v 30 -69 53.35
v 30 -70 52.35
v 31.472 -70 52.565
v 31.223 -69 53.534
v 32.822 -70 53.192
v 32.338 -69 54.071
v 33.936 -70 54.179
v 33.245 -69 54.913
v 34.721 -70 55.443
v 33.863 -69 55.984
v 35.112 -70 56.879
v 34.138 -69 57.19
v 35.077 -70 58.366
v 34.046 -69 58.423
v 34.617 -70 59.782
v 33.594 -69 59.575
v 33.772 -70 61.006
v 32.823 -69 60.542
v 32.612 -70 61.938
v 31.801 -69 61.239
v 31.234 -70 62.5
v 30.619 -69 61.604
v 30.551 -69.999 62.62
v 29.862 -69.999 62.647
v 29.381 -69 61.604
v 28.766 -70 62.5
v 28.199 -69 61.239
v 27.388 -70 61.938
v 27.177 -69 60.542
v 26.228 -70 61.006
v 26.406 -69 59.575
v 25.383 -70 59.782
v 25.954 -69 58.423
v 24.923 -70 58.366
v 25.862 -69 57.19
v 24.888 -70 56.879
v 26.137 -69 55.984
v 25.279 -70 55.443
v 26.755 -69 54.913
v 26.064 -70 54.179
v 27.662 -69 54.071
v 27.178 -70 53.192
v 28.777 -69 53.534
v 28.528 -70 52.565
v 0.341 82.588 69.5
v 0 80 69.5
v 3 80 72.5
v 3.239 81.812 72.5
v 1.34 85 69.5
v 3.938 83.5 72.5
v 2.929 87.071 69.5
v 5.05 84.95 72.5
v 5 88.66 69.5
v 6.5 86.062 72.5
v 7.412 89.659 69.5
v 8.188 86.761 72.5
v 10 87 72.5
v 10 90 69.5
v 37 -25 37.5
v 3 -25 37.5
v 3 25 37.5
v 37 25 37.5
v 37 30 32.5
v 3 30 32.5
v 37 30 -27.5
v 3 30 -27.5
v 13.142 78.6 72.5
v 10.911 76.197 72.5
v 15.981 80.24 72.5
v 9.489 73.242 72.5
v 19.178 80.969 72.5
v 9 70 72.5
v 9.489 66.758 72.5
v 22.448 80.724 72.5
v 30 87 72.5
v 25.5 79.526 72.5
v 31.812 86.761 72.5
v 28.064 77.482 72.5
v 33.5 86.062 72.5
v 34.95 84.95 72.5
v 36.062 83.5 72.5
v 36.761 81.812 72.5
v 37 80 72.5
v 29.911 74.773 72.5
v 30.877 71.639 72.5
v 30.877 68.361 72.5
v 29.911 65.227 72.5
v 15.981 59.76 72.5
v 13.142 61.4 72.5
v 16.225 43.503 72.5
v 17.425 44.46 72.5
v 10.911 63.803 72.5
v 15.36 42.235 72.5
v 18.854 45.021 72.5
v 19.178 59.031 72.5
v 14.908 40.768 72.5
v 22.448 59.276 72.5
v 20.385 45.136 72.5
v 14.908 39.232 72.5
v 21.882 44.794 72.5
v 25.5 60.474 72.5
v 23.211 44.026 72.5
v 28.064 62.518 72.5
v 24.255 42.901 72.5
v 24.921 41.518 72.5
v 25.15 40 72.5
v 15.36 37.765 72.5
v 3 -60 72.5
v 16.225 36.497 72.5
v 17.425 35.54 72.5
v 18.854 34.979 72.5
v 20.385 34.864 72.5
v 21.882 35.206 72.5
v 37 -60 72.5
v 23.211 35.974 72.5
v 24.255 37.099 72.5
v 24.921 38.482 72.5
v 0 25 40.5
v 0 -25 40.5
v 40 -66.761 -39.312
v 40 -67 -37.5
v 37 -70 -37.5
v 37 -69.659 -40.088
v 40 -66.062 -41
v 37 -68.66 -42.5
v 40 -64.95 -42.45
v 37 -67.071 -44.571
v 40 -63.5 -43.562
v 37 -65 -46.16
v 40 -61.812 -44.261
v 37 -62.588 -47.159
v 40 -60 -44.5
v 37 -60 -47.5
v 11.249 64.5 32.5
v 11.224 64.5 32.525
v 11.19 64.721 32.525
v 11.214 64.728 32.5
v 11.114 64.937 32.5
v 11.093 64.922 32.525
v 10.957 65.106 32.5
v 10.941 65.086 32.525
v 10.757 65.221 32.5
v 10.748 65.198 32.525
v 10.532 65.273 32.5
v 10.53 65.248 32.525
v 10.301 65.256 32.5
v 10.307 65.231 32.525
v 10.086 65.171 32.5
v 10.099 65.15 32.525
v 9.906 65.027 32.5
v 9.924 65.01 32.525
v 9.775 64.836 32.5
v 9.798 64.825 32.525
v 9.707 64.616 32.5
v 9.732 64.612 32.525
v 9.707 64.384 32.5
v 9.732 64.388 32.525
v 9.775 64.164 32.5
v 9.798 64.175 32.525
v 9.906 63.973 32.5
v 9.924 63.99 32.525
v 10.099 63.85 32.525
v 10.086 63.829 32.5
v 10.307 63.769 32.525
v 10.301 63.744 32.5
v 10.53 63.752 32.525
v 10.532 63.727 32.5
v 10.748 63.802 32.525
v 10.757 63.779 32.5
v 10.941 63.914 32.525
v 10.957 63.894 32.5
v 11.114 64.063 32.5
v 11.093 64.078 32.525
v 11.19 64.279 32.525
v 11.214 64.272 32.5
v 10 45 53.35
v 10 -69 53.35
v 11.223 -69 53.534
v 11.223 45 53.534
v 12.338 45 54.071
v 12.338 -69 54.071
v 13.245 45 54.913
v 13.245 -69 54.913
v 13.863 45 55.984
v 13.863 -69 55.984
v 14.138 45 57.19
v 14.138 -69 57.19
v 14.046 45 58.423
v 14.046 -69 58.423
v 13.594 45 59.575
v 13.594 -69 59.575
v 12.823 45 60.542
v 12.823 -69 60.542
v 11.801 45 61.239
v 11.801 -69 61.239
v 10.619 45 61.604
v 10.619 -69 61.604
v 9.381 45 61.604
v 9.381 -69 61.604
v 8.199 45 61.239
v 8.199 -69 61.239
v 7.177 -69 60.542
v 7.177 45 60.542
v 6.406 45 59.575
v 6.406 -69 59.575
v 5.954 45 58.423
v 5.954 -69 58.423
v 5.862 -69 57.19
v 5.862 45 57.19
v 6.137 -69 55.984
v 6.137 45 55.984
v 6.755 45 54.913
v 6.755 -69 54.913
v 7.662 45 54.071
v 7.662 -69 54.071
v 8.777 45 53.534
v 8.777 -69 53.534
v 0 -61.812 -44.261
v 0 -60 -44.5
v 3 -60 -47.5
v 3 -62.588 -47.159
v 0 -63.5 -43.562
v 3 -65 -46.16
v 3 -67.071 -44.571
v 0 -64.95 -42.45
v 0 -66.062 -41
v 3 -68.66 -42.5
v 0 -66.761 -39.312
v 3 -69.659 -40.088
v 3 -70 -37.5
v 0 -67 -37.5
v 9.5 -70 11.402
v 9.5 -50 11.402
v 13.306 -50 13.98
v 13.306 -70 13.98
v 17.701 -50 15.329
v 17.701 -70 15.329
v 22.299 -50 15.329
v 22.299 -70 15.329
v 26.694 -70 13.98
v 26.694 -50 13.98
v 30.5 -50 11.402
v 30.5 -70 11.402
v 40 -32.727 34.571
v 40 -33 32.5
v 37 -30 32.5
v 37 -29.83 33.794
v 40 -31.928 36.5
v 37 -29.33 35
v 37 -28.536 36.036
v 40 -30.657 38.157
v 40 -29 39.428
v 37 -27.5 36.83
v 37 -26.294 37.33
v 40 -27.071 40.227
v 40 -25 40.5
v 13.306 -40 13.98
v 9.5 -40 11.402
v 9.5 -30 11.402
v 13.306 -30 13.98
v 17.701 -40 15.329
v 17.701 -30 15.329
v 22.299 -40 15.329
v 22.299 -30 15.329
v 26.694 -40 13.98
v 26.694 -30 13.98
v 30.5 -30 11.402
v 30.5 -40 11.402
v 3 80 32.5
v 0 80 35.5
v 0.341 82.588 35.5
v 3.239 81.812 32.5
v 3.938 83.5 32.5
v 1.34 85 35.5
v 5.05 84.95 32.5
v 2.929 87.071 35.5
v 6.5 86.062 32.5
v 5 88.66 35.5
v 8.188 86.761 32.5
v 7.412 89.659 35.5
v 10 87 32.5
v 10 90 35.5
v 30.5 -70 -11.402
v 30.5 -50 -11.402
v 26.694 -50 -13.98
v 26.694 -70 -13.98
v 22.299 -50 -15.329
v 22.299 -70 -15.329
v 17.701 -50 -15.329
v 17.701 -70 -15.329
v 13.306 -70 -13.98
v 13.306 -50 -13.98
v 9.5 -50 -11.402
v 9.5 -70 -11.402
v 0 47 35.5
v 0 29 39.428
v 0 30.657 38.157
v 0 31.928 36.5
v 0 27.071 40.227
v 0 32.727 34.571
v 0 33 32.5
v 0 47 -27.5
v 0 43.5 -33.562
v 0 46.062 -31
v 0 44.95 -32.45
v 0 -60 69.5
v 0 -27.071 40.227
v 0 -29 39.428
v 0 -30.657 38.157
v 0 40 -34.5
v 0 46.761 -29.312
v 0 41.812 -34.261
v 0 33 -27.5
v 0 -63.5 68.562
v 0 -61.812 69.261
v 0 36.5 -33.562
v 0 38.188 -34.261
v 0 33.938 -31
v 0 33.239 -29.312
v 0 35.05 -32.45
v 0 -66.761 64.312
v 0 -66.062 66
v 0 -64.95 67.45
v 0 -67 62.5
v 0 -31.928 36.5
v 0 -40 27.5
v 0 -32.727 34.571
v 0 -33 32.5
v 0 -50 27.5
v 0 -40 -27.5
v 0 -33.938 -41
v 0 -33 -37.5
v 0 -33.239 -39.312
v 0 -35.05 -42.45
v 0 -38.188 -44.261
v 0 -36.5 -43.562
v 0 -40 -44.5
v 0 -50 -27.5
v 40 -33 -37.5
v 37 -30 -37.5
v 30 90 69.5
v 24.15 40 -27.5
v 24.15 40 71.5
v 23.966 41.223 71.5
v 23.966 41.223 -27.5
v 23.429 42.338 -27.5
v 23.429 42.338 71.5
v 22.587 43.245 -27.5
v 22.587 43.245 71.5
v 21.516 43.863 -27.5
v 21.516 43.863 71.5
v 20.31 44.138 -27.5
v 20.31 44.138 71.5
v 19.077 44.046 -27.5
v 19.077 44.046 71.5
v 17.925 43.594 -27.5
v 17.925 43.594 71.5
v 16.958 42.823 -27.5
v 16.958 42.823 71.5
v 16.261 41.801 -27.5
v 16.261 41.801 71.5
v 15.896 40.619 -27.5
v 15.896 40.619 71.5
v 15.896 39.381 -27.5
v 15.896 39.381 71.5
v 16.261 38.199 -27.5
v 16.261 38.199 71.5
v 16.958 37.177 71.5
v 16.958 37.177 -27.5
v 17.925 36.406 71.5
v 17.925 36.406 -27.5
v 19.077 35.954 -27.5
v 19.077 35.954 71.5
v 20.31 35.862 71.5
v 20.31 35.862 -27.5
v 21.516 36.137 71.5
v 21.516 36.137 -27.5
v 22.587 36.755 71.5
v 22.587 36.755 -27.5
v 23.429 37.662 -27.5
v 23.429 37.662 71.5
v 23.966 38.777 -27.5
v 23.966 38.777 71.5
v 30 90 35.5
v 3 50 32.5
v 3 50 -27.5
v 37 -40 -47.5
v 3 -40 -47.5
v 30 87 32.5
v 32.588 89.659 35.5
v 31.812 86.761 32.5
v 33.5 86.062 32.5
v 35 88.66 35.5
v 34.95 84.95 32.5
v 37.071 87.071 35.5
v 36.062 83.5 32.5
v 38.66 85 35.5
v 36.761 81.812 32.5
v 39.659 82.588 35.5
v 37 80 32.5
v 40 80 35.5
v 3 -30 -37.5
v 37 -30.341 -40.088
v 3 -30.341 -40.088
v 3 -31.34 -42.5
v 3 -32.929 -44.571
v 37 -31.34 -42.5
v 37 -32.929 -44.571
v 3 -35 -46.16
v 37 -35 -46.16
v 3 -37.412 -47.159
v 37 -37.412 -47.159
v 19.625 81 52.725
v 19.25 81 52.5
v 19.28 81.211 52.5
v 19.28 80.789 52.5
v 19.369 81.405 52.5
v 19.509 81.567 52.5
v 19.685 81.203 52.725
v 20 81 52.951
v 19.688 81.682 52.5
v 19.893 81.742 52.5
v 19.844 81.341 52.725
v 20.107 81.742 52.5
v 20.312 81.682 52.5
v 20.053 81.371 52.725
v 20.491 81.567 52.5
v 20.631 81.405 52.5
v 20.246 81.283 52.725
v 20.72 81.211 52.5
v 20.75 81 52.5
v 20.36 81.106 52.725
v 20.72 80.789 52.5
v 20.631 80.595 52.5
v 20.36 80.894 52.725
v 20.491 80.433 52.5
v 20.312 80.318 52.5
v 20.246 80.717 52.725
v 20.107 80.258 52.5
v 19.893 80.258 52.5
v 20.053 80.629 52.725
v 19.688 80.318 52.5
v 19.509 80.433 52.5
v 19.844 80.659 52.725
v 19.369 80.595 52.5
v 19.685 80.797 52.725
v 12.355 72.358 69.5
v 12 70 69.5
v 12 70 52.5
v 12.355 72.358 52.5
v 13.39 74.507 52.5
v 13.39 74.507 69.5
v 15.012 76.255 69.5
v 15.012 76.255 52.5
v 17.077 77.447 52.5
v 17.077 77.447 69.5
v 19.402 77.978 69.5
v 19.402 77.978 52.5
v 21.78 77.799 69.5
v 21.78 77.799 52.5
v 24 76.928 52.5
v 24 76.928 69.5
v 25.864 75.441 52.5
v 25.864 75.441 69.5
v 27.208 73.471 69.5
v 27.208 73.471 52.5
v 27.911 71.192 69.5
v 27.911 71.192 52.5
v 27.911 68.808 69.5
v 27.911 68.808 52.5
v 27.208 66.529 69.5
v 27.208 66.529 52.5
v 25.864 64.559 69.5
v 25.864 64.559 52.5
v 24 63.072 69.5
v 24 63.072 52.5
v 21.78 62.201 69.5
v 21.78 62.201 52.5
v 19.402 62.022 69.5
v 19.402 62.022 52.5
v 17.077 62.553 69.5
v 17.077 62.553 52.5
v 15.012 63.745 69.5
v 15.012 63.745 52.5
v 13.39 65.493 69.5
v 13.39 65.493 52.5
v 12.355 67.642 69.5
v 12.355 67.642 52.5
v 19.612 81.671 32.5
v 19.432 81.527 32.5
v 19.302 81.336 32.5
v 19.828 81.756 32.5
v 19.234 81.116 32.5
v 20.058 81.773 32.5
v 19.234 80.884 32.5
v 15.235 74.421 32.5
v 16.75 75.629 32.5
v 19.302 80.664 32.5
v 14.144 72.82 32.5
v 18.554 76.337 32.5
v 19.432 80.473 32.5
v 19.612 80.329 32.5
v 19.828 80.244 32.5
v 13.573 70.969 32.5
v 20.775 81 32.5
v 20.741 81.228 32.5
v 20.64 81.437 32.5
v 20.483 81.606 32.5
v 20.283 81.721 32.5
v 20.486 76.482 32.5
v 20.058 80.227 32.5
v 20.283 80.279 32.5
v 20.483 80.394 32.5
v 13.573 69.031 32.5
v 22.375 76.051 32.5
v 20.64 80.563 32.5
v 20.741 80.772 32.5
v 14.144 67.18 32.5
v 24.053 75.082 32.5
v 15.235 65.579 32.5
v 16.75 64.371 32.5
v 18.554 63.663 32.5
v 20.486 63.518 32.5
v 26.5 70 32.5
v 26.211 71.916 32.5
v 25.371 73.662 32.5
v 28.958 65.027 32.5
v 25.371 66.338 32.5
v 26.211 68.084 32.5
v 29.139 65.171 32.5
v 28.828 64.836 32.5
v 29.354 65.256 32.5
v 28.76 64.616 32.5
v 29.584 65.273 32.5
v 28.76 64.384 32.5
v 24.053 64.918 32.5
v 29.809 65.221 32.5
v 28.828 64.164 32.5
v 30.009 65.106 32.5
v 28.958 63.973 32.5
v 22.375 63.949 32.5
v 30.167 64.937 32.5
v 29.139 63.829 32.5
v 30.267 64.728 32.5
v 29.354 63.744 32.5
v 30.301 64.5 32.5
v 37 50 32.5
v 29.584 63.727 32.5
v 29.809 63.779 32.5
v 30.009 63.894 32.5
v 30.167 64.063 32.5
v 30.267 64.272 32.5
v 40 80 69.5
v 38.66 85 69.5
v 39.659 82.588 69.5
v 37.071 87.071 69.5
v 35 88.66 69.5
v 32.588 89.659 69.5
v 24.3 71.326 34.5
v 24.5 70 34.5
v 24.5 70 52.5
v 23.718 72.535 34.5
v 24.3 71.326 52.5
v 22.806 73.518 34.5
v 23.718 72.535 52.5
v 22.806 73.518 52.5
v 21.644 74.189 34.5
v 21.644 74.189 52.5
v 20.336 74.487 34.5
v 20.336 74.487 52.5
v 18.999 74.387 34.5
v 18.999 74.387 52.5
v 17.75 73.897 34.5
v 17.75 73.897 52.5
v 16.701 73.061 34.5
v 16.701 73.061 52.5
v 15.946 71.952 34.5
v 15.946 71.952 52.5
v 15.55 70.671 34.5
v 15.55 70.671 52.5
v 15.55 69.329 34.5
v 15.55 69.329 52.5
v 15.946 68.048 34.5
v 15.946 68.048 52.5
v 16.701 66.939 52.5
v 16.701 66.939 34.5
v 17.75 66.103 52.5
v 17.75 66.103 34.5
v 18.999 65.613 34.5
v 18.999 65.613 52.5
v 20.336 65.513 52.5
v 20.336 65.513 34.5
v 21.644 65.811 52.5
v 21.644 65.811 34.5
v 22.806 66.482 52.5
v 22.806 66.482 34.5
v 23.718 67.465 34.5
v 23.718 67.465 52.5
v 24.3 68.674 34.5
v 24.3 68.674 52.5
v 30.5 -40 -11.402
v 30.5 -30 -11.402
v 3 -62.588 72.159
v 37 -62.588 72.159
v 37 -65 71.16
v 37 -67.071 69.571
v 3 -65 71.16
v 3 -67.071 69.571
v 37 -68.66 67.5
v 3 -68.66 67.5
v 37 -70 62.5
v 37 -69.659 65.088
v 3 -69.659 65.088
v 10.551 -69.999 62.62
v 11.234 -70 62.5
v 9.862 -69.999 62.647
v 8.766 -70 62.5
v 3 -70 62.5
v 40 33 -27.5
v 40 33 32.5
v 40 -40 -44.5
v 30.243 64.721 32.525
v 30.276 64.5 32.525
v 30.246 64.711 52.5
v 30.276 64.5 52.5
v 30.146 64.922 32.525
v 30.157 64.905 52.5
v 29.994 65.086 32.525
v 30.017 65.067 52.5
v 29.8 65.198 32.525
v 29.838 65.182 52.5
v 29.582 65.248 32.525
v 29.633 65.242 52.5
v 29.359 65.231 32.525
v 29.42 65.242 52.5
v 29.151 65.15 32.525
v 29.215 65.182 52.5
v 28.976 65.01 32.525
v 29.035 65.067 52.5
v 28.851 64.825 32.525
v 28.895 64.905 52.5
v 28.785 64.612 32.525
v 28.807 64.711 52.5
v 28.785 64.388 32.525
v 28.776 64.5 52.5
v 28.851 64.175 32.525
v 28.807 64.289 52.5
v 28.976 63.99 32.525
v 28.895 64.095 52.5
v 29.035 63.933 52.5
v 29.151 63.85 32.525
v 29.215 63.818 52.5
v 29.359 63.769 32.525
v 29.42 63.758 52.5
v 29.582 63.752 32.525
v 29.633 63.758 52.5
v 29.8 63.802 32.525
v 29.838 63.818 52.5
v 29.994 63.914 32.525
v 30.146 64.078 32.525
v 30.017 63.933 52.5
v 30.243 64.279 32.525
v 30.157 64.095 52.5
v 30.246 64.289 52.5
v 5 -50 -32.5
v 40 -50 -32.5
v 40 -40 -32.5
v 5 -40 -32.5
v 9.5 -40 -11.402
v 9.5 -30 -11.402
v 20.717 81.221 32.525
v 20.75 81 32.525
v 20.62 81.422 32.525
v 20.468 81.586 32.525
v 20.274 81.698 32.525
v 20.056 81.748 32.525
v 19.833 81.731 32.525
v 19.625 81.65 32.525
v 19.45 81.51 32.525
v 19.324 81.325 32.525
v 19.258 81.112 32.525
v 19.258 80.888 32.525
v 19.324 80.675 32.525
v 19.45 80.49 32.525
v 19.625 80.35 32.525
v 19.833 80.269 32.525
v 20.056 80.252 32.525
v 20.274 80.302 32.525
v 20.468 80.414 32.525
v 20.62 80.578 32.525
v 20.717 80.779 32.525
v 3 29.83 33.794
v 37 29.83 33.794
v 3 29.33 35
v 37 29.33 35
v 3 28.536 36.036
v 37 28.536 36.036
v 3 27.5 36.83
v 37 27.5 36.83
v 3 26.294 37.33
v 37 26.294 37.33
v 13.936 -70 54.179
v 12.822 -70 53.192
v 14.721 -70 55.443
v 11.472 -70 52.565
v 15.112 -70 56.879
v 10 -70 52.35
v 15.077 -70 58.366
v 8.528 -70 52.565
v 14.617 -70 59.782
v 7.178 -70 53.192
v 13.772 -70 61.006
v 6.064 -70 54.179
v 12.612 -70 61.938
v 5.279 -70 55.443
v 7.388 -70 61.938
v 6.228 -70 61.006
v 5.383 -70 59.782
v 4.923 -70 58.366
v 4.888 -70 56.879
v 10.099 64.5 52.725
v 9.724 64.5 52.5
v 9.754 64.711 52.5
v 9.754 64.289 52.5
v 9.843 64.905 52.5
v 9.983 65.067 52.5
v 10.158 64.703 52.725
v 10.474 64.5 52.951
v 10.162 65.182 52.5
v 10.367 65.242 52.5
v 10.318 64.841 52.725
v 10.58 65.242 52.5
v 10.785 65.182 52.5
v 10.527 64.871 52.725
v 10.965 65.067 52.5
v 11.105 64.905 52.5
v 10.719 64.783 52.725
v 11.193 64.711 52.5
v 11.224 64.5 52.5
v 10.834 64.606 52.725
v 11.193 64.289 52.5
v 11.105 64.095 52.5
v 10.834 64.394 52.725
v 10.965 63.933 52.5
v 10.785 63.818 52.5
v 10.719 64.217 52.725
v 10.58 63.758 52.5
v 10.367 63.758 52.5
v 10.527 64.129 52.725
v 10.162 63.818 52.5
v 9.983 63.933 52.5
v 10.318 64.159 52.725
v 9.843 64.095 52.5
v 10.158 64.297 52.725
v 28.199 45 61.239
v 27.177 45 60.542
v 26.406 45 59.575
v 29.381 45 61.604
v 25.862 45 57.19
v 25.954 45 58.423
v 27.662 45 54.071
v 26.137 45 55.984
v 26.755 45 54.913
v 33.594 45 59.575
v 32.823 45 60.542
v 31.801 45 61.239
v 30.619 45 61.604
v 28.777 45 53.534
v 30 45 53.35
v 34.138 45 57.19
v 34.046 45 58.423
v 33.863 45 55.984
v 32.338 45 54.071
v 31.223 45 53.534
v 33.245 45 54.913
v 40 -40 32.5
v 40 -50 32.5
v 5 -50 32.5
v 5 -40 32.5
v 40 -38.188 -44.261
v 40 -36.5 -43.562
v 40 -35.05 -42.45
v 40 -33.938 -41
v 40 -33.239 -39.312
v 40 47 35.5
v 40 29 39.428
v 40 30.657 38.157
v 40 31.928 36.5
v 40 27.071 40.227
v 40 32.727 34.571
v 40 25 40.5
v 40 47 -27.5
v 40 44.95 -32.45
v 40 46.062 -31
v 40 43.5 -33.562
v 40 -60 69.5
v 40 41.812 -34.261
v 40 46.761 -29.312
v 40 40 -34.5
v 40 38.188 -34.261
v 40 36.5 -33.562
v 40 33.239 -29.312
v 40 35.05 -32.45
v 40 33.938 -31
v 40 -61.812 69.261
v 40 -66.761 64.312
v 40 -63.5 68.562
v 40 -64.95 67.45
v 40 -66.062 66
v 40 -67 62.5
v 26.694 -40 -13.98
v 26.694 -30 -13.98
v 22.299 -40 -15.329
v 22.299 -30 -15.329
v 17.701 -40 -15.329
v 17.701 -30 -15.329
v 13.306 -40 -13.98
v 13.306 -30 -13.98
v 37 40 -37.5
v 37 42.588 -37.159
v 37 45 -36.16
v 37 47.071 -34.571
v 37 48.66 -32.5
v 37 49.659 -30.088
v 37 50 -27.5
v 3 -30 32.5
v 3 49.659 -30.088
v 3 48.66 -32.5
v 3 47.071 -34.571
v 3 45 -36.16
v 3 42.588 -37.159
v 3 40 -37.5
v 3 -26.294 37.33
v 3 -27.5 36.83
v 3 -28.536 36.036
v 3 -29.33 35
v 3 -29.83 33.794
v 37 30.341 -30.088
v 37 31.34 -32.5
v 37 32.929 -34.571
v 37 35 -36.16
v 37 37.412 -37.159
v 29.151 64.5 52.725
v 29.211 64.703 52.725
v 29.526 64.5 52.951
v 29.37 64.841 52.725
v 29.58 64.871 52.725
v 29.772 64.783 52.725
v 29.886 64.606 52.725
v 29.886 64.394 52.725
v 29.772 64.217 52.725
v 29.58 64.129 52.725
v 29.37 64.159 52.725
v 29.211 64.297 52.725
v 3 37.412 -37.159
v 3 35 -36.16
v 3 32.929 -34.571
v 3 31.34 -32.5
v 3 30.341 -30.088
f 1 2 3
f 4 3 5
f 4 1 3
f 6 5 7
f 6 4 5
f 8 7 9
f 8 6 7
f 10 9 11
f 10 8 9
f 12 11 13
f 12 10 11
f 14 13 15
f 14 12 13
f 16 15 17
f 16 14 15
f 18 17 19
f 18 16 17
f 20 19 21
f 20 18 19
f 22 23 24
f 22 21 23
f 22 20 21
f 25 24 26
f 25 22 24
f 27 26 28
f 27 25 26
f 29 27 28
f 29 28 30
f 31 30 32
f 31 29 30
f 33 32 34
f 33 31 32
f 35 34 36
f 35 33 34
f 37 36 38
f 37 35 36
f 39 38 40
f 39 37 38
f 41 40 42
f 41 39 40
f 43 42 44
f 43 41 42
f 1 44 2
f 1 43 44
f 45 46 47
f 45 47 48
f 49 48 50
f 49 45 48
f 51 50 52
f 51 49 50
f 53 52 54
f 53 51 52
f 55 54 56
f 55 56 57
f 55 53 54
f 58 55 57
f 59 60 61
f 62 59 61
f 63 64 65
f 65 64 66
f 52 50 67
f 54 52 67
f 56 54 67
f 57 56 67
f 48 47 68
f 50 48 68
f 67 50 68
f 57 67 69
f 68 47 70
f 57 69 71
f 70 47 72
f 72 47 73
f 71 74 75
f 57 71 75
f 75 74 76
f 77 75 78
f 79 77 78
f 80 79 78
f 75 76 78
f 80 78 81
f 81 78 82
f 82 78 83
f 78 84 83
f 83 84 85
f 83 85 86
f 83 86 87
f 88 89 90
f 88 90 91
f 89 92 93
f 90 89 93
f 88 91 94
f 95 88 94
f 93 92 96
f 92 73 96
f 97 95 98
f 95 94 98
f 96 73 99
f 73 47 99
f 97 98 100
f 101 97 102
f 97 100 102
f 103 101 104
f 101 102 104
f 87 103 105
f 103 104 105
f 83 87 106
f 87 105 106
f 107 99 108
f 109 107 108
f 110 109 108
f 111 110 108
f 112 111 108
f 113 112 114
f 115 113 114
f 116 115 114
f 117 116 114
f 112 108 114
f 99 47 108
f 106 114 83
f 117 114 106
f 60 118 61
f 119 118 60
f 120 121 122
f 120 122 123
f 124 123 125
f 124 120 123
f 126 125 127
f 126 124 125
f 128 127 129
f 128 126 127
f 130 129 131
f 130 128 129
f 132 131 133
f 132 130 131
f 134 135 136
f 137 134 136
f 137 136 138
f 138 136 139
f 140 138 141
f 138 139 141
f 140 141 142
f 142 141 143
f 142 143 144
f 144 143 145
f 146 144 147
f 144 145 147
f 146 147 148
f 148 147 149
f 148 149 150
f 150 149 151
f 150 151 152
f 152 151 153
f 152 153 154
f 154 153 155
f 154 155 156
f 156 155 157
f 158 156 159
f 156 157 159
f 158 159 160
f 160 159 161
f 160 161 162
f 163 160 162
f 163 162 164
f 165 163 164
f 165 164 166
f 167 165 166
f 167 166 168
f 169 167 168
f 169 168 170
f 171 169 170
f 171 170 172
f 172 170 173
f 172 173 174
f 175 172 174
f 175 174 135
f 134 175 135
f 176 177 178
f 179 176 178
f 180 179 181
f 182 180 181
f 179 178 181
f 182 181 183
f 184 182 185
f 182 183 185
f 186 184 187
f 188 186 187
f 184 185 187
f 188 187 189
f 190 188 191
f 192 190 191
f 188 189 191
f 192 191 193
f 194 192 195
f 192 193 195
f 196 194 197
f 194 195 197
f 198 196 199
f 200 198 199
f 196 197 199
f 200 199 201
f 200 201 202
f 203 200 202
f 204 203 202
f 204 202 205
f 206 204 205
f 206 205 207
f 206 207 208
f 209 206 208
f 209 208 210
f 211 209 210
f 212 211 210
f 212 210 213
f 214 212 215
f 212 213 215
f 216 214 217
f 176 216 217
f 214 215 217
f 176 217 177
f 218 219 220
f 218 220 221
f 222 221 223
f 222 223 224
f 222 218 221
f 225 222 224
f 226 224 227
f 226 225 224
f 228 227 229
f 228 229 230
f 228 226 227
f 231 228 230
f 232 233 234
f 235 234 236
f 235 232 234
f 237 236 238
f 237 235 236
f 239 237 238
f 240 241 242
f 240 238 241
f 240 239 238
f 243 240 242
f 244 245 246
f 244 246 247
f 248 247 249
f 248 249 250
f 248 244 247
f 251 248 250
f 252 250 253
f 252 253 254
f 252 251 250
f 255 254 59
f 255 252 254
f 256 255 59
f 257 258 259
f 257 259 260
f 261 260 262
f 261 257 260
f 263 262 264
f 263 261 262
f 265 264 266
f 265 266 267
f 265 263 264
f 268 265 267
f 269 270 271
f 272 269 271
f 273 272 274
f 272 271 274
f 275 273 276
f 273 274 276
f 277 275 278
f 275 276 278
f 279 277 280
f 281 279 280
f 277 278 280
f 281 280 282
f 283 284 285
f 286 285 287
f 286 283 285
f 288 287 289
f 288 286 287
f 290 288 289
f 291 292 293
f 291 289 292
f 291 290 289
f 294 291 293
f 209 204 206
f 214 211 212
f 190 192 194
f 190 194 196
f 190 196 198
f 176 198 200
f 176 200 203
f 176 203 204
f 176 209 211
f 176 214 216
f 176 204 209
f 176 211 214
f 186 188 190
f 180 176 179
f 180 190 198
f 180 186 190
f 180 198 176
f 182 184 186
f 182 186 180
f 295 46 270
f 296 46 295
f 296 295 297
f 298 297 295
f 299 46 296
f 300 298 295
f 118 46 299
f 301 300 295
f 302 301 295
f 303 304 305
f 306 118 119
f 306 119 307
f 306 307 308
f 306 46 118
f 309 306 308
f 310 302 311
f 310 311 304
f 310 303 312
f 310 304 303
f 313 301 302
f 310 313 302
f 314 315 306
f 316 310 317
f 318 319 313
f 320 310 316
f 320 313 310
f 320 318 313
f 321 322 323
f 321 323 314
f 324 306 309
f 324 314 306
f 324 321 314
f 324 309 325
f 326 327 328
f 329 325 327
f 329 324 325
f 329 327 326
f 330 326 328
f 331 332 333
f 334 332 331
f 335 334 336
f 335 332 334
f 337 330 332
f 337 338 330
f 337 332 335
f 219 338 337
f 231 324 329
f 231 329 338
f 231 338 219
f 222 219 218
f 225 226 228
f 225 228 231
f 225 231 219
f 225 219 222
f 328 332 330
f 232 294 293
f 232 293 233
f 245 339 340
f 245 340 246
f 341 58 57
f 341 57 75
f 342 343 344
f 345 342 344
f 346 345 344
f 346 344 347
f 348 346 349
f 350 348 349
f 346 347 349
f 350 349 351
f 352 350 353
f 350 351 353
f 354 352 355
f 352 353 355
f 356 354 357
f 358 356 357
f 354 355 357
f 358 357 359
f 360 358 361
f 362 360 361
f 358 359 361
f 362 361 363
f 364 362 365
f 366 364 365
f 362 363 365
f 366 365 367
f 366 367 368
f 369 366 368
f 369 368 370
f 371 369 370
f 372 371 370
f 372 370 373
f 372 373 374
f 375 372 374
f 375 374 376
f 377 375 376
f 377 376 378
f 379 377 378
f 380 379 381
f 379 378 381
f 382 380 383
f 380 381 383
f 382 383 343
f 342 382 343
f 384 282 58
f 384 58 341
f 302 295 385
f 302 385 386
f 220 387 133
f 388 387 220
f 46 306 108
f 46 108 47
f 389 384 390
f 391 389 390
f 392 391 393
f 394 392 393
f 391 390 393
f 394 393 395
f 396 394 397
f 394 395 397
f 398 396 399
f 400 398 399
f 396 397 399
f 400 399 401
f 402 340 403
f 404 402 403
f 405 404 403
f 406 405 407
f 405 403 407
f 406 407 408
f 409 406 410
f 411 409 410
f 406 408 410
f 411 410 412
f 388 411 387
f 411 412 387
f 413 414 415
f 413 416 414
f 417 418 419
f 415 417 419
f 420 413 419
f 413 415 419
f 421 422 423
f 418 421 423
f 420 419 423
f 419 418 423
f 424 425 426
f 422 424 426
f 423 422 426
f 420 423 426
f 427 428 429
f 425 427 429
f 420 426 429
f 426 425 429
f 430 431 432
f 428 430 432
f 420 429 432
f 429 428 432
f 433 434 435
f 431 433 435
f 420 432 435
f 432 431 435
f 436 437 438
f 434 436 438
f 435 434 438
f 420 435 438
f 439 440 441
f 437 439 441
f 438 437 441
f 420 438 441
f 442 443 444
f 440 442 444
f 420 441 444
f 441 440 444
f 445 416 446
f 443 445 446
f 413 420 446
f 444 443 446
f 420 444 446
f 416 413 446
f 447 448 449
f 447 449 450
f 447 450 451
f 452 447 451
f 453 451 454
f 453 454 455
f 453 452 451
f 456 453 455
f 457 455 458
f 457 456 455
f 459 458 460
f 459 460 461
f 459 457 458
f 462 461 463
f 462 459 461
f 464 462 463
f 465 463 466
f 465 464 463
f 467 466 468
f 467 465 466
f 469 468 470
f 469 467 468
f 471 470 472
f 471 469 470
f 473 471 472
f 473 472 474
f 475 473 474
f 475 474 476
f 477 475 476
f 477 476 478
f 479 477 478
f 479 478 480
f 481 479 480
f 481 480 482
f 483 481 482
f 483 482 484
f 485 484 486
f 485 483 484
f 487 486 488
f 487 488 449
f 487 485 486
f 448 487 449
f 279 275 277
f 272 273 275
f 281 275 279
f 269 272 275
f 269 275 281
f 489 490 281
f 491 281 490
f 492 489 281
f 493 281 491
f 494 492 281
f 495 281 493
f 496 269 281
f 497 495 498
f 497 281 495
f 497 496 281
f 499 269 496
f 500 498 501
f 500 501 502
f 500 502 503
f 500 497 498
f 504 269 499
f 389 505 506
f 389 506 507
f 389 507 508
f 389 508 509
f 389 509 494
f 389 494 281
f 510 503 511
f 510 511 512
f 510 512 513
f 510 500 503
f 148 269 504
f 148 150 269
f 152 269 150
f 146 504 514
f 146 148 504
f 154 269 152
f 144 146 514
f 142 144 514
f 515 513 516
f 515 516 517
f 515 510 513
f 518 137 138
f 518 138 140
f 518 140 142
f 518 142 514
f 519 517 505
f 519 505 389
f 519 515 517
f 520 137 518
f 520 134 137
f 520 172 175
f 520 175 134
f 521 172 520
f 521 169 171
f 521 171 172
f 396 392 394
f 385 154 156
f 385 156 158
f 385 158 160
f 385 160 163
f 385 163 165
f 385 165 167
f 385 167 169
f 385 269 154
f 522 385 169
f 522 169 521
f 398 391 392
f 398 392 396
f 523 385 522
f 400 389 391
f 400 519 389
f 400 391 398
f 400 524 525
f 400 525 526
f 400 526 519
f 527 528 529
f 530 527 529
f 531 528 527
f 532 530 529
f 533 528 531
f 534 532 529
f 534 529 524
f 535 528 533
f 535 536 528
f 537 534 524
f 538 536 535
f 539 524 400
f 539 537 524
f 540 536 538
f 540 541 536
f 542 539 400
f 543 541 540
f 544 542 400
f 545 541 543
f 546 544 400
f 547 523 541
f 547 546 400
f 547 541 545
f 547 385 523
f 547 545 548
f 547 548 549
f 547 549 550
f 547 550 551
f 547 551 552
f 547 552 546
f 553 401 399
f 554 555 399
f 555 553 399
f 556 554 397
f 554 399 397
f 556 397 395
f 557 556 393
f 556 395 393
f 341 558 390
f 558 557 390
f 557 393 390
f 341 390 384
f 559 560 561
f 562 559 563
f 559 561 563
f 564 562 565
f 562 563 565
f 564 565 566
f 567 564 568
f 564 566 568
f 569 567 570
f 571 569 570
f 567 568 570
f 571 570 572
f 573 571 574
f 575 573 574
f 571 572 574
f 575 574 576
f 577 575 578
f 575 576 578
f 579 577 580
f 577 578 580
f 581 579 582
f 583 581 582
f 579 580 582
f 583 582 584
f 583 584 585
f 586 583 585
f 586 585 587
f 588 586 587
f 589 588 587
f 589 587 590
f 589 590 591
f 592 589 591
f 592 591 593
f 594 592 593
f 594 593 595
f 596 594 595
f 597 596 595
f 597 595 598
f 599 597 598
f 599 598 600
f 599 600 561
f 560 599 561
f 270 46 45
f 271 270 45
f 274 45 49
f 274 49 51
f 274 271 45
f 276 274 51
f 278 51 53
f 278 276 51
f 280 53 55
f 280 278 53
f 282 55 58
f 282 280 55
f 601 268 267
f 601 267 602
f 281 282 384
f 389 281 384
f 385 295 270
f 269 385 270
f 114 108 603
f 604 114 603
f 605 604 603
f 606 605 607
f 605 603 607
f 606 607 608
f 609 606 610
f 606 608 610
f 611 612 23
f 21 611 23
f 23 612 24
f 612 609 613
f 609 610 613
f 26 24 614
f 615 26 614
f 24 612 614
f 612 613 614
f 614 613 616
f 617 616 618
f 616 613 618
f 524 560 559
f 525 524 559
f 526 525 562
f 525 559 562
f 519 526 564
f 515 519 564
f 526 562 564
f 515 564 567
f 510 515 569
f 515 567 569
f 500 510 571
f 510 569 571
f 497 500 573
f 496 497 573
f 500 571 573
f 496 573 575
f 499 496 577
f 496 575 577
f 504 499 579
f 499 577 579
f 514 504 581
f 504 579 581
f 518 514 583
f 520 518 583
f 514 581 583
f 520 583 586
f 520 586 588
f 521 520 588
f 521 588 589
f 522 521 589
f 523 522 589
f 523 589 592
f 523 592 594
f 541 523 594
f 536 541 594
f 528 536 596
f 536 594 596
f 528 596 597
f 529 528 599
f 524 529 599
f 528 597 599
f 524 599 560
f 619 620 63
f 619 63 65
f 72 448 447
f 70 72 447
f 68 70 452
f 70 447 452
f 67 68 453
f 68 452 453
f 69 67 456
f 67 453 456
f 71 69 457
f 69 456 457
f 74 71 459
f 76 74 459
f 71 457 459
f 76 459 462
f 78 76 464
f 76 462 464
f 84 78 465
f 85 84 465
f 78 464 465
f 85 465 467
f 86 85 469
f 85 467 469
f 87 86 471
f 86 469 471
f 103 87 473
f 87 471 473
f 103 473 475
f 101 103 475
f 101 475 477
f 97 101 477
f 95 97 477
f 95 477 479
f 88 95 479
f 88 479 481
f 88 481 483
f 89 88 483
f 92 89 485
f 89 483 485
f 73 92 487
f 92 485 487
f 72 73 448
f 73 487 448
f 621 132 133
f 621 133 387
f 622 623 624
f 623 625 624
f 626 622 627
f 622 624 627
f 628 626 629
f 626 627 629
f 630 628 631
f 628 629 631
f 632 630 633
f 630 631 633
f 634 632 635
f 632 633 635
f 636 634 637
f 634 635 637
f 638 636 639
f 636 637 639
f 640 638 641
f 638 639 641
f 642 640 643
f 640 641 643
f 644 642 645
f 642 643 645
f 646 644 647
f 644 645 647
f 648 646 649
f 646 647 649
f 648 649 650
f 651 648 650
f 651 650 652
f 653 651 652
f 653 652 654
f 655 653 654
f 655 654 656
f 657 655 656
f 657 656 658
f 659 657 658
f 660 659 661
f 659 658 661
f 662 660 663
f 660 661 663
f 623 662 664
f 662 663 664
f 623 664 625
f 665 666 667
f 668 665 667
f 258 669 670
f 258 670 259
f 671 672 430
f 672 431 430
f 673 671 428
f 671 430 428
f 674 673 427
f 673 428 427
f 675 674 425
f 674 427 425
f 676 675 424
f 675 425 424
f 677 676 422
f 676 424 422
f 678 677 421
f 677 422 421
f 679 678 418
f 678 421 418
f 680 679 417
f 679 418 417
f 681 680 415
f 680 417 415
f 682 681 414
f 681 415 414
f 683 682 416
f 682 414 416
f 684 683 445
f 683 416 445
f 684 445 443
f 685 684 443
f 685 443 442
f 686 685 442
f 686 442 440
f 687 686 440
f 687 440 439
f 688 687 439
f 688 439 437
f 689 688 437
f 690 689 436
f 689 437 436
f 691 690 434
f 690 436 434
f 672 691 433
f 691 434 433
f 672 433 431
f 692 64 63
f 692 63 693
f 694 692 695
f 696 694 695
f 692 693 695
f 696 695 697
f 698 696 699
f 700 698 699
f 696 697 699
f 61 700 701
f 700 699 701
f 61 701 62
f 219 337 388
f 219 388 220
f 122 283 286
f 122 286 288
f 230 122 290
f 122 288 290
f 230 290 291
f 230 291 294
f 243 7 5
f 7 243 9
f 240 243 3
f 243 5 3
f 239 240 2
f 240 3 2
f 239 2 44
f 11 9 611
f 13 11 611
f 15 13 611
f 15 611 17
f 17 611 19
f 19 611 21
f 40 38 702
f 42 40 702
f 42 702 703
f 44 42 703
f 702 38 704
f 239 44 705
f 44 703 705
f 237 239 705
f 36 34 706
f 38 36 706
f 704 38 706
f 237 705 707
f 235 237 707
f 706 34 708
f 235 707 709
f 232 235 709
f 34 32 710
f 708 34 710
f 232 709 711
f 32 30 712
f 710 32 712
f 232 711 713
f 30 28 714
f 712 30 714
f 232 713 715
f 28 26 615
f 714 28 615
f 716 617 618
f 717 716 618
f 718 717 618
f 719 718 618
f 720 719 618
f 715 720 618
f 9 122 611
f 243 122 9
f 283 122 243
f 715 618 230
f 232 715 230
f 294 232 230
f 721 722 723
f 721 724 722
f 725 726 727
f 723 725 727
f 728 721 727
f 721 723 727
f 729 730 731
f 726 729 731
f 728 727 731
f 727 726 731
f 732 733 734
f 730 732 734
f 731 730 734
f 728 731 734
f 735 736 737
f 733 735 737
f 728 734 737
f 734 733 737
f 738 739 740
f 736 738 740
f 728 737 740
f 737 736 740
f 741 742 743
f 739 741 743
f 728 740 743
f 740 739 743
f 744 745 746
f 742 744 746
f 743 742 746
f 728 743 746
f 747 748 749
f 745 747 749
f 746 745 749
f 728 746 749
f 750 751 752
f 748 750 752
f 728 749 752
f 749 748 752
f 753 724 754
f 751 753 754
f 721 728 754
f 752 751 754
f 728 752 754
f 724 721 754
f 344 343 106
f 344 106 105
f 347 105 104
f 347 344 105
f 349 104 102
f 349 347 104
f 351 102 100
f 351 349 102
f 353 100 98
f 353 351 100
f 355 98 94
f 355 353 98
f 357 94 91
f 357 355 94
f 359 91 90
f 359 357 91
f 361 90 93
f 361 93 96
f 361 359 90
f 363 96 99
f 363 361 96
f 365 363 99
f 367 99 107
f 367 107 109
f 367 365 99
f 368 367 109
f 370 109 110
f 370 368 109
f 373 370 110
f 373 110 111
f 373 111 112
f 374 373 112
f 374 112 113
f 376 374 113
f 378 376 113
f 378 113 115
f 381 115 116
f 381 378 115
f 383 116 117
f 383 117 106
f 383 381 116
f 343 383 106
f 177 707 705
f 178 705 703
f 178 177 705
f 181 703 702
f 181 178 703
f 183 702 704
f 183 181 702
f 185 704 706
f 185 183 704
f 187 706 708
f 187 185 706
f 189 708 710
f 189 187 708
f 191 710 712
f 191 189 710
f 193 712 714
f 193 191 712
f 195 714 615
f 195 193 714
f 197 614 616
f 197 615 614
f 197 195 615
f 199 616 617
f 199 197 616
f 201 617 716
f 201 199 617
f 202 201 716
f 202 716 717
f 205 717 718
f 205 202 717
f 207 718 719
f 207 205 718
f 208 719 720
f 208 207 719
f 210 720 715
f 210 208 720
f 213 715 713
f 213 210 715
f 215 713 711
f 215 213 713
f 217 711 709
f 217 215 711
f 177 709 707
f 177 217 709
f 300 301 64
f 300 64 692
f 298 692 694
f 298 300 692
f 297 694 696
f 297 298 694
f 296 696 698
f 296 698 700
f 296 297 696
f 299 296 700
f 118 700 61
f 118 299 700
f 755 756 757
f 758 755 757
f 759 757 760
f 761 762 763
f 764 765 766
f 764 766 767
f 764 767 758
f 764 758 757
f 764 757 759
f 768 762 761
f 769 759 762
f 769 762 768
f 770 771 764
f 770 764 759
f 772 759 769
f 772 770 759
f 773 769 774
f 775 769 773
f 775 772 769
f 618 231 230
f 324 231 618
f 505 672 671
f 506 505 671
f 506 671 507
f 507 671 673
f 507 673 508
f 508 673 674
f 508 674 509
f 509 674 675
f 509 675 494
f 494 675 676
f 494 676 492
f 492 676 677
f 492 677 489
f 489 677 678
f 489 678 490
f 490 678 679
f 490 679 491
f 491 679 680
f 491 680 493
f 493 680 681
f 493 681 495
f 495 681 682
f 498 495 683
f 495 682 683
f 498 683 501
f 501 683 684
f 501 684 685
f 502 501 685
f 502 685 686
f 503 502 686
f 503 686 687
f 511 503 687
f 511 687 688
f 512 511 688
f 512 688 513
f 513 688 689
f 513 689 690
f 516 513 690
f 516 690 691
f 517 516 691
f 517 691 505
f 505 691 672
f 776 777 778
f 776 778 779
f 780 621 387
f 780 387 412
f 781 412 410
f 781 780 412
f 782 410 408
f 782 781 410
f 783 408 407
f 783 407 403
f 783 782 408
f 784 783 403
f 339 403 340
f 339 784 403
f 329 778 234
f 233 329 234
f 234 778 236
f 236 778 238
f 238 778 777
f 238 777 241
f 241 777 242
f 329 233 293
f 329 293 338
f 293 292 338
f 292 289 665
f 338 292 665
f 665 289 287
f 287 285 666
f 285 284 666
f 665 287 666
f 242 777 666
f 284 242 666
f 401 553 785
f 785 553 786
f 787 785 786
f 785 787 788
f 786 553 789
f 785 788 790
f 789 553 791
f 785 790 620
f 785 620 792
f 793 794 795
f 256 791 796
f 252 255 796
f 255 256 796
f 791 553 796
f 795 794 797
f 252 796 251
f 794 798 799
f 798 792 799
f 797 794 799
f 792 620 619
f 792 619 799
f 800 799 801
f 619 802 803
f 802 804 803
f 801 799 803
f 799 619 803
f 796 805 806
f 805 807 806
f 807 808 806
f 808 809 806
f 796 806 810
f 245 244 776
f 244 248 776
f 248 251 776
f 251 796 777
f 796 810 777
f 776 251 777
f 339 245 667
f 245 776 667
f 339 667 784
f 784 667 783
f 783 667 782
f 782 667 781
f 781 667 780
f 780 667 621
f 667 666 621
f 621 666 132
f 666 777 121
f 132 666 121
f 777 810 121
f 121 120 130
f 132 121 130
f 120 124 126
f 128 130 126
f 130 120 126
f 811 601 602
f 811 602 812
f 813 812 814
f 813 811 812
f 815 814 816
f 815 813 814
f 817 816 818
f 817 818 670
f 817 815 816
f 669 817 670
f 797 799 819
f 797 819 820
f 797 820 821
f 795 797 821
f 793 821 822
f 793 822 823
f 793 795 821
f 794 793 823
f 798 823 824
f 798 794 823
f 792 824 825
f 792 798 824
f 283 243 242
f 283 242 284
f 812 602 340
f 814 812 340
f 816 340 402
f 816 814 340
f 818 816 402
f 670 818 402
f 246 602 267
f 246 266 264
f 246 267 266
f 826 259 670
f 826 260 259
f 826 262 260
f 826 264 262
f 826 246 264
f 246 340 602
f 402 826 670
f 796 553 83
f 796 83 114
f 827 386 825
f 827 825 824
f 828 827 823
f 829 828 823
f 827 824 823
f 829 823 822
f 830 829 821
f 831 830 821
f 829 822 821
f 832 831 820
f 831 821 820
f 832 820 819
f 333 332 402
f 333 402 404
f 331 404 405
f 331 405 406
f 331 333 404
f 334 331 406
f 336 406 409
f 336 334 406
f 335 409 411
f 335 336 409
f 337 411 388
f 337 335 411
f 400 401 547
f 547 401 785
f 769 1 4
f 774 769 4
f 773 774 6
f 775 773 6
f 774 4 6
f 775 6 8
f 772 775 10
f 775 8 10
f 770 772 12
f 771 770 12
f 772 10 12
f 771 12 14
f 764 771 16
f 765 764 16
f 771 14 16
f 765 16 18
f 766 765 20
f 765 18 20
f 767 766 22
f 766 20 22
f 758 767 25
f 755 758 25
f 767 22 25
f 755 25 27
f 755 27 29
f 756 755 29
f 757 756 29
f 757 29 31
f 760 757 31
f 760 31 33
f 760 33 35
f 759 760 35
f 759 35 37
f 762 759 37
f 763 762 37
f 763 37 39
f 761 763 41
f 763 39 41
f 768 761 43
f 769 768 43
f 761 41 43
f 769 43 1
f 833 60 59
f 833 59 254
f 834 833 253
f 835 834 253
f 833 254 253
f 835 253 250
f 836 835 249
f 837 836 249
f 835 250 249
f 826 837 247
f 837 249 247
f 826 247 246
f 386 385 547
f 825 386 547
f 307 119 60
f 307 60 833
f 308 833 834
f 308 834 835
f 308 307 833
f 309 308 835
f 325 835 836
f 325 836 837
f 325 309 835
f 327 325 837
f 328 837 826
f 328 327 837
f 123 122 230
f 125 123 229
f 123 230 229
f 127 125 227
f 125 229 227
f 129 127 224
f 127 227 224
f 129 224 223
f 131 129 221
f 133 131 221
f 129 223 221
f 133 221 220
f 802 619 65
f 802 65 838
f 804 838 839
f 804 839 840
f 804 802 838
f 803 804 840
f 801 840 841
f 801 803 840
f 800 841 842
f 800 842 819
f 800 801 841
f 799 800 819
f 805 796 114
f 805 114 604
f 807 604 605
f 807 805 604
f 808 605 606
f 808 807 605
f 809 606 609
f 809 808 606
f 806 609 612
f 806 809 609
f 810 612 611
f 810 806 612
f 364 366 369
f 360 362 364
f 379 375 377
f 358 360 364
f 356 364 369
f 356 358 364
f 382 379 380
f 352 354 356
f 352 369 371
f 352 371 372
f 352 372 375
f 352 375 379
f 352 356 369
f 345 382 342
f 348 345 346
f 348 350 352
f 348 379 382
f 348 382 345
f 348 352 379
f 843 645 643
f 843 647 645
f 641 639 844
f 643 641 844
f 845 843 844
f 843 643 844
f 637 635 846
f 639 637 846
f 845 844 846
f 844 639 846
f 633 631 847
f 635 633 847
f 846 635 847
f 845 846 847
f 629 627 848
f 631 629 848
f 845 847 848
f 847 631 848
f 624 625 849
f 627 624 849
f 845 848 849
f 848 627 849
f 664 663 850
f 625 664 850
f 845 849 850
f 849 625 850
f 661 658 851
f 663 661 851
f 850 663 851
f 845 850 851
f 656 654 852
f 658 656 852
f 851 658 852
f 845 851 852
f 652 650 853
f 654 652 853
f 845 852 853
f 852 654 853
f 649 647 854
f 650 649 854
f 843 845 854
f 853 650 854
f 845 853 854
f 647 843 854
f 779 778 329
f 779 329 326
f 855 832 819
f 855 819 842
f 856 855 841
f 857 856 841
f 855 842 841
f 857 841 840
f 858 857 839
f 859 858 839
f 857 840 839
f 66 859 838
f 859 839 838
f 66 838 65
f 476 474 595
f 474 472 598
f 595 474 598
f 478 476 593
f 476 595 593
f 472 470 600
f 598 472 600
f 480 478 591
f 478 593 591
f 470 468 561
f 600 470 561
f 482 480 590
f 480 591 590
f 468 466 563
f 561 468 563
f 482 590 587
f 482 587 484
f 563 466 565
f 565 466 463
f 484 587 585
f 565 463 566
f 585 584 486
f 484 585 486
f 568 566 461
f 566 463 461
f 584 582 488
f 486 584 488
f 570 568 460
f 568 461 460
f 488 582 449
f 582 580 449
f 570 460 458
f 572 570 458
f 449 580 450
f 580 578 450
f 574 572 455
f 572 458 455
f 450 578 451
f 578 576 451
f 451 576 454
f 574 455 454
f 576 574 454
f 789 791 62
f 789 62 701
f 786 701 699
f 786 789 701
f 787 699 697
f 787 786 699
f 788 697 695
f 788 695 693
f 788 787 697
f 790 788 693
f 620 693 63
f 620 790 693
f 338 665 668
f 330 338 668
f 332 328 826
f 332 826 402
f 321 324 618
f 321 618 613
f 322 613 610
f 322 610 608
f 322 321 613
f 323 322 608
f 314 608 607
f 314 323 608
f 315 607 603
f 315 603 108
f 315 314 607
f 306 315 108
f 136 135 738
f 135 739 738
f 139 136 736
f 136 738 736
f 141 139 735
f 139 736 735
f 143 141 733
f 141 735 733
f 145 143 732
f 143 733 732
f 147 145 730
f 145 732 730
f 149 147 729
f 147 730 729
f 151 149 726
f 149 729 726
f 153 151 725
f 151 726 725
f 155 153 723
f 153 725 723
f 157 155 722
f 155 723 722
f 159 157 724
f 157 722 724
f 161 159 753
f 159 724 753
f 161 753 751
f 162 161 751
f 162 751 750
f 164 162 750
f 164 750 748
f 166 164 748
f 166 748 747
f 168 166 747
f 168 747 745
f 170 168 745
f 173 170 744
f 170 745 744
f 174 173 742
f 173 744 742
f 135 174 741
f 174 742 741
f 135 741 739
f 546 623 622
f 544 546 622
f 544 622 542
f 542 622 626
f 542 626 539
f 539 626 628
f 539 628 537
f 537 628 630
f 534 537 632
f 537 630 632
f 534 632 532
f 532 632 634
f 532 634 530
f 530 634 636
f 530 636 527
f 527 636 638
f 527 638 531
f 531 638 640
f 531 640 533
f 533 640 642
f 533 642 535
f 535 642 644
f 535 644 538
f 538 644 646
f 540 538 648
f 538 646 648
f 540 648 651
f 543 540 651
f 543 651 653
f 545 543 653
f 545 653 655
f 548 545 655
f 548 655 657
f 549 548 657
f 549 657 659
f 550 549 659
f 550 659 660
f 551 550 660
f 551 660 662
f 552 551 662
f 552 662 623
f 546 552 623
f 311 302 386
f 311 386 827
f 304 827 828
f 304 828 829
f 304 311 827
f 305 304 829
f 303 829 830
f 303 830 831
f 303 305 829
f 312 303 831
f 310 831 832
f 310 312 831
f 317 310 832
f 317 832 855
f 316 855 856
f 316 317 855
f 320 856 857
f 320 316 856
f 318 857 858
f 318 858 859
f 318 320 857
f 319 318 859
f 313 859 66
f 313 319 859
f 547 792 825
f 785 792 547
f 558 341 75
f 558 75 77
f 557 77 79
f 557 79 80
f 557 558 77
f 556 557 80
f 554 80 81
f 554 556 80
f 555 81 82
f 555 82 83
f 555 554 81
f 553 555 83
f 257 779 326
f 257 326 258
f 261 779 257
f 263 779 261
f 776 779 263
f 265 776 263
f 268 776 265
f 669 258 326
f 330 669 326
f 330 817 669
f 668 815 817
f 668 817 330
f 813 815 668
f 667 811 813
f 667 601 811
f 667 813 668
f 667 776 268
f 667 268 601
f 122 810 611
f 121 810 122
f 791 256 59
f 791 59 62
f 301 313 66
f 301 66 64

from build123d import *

# Parameters (mm, degrees)
BOSS_EXTRUDE1_DEPTH             = 40
SKETCH2_W                       = 65
SKETCH2_H                       = 10
CUT_EXTRUDE1_DEPTH              = 35
CUT_EXTRUDE2_DEPTH              = 40
SKETCH4_W                       = 55
SKETCH4_H                       = 10
CUT_EXTRUDE3_DEPTH              = 98.114622998
CHAMFER1_SIZE                   = 5
SKETCH5_W                       = 40
SKETCH5_H                       = 120
BOSS_EXTRUDE2_DEPTH             = 15
SKETCH16_W                      = 40
SKETCH16_H                      = 40
BOSS_EXTRUDE4_DEPTH             = 10
SKETCH6_R                       = 4.15
CUT_EXTRUDE4_DEPTH              = 115
CHAMFER2_SIZE                   = 1
FILLET1_R                       = 10
FILLET2_R                       = 5
SKETCH9_W                       = 40
SKETCH9_H                       = 40
BOSS_EXTRUDE3_DEPTH             = 40
FILLET3_R                       = 10
SKETCH10_R                      = 8
CUT_EXTRUDE6_DEPTH              = 20
SKETCH11_R                      = 4.5
CUT_EXTRUDE7_DEPTH              = 30
SKETCH12_R                      = 4.15
CUT_EXTRUDE8_DEPTH              = 100
CHAMFER7_SIZE                   = 1
FILLET5_R                       = 10
CHAMFER10_SIZE                  = 3
CHAMFER11_SIZE                  = 2
FILLET6_R                       = 10
CHAMFER13_SIZE                  = 3
F_1_5MM_DOWEL_HOLE1_D           = 1.5
F_1_5MM_DOWEL_HOLE1_DEPTH       = 20
F_1_5MM_DOWEL_HOLE1_CSINK_D     = 1.55
F_1_5MM_DOWEL_HOLE1_CSINK_ANGLE = 90
F_1_5MM_DOWEL_HOLE1_TIP         = 0.450645464


# Some blends are built 0.0001 mm under size
with BuildPart() as part:
    # Sketch1 → Boss-Extrude1 (new body)
    with BuildSketch(Plane(origin=(0, 0, 0), x_dir=(0, 0, -1), z_dir=(1, 0, 0))):
        Polygon((37.5, 30), (37.5, 50), (-57.5, 50), (-57.5, -70), (37.5, -70), (37.5, -30), (-37.5, -30), (-37.5, 30), align=None)
    extrude(amount=BOSS_EXTRUDE1_DEPTH)

    # Sketch2 → Cut-Extrude1 (cut)
    with BuildSketch(Plane(origin=(40, 0, 0), x_dir=(0, 0, -1), z_dir=(1, 0, 0))):
        with Locations((0, -45)):
            Rectangle(SKETCH2_W, SKETCH2_H)
    extrude(amount=-CUT_EXTRUDE1_DEPTH, mode=Mode.SUBTRACT)

    # Sketch3 → Cut-Extrude2 (cut)
    with BuildSketch(Plane.XZ.offset(70)):
        with BuildLine():
            Line((9.5, -11.401754251), (9.5, 11.401754251))
            ThreePointArc((9.5, 11.401754251), (20, 15.5), (30.5, 11.401754251))
            Line((30.5, 11.401754251), (30.5, -11.401754251))
            ThreePointArc((30.5, -11.401754251), (20, -15.5), (9.5, -11.401754251))
        make_face()
    extrude(amount=-CUT_EXTRUDE2_DEPTH, mode=Mode.SUBTRACT)

    # Sketch4 → Cut-Extrude3 (cut, through all)
    with BuildSketch(Plane(origin=(5, 0, 0), x_dir=(0, 0, -1), z_dir=(1, 0, 0))):
        with Locations((0, -45)):
            Rectangle(SKETCH4_W, SKETCH4_H)
    extrude(amount=-CUT_EXTRUDE3_DEPTH, mode=Mode.SUBTRACT)

    # Chamfer1
    chamfer1_edges = [part.edges().sort_by_distance(p)[0] for p in [
        (5, -45, 27.5),
        (5, -45, -27.5),
    ]]
    chamfer(chamfer1_edges, length=CHAMFER1_SIZE - 0.0001)  # a hair under: the kernel refuses the full size

    # Sketch5 → Boss-Extrude2 (add)
    with BuildSketch(Plane.XY.offset(57.5)):
        with Locations((20, -10)):
            Rectangle(SKETCH5_W, SKETCH5_H)
    extrude(amount=BOSS_EXTRUDE2_DEPTH)

    # Sketch16 → Boss-Extrude4 (add)
    with BuildSketch(Plane(origin=(0, 0, -37.5), x_dir=(-1, 0, 0), z_dir=(0, 0, -1))):
        with Locations((-20, -50)):
            Rectangle(SKETCH16_W, SKETCH16_H)
    extrude(amount=BOSS_EXTRUDE4_DEPTH)

    # Sketch6 → Cut-Extrude4 (cut)
    with BuildSketch(Plane.XZ.offset(70)):
        with Locations(Location((30, 57.5, 0), (0, 0, 270))):
            Circle(SKETCH6_R)
        with Locations(Location((10, 57.5, 0), (0, 0, 270))):
            Circle(SKETCH6_R)
    extrude(amount=-CUT_EXTRUDE4_DEPTH, mode=Mode.SUBTRACT)

    # Chamfer2
    chamfer2_edges = [part.edges().sort_by_distance(p)[0] for p in [
        (30, -70, 61.65),
        (10, -70, 61.65),
    ]]
    chamfer(chamfer2_edges, length=CHAMFER2_SIZE)

    # Fillet1
    # the kernel refuses this fillet: 10 mm, written as the material it takes off along each edge
    with BuildSketch(Plane(origin=(-25, -70, -47.5), x_dir=(0, 0, 1), z_dir=(1, 0, 0))) as fillet1_piece_1:
        with BuildLine():
            CenterArc((FILLET1_R, -FILLET1_R), FILLET1_R, 90, 90)
            Line((0, -FILLET1_R), (0, 0))
            Line((0, 0), (FILLET1_R, 0))
        make_face()
    extrude(amount=90, mode=Mode.SUBTRACT)
    with BuildSketch(Plane(origin=(65, -30, -47.5), x_dir=(0, -1, 0), z_dir=(-1, 0, 0)), Plane(origin=(-25, -70, 72.5), x_dir=(0, 0, -1), z_dir=(1, 0, 0))) as fillet1_piece_2:
        with BuildLine():
            CenterArc((FILLET1_R, FILLET1_R), FILLET1_R, 180, 90)
            Line((0, FILLET1_R), (0, 0))
            Line((0, 0), (FILLET1_R, 0))
        make_face()
    extrude(amount=90, mode=Mode.SUBTRACT)

    # Fillet2
    fillet2_edges = [part.edges().sort_by_distance(p)[0] for p in [
        (20, 30, 37.5),
        (20, -30, 37.5),
    ]]
    fillet(fillet2_edges, radius=FILLET2_R)

    # Sketch9 → Boss-Extrude3 (add)
    with BuildSketch(Plane(origin=(0, 50, 0), x_dir=(1, 0, 0), z_dir=(0, 1, 0))):
        with Locations((20, -52.5)):
            Rectangle(SKETCH9_W, SKETCH9_H)
    extrude(amount=BOSS_EXTRUDE3_DEPTH)

    # Fillet3
    fillet3_edges = [part.edges().sort_by_distance(p)[0] for p in [
        (0, 90, 52.5),
        (40, 90, 52.5),
    ]]
    fillet(fillet3_edges, radius=FILLET3_R)

    # Sketch10 → Cut-Extrude6 (cut)
    with BuildSketch(Plane(origin=(0, 0, 72.5), x_dir=(-1, 0, 0), z_dir=(0, 0, -1))):
        with Locations((-20, 70)):
            Circle(SKETCH10_R)
    extrude(amount=CUT_EXTRUDE6_DEPTH, mode=Mode.SUBTRACT)

    # Sketch11 → Cut-Extrude7 (cut)
    with BuildSketch(Plane.XY.offset(52.5)):
        with Locations((20, 70)):
            Circle(SKETCH11_R)
    extrude(amount=-CUT_EXTRUDE7_DEPTH, mode=Mode.SUBTRACT)

    # Sketch12 → Cut-Extrude8 (cut)
    with BuildSketch(Plane.XY.offset(72.5)):
        with Locations((20, 40)):
            Circle(SKETCH12_R)
    extrude(amount=-CUT_EXTRUDE8_DEPTH, mode=Mode.SUBTRACT)

    # Chamfer7
    chamfer7_edges = [part.edges().sort_by_distance(p)[0] for p in [
        (15.85, 40, 72.5),
    ]]
    chamfer(chamfer7_edges, length=CHAMFER7_SIZE)

    # Fillet5
    fillet5_edges = [part.edges().sort_by_distance(p)[0] for p in [
        (20, 30, -37.5),
    ]]
    fillet(fillet5_edges, radius=FILLET5_R)

    # Chamfer10
    chamfer10_edges = [part.edges().sort_by_distance(p)[0] for p in [
        (28, 70, 72.5),
    ]]
    chamfer(chamfer10_edges, length=CHAMFER10_SIZE)

    # Chamfer11
    chamfer11_edges = [part.edges().sort_by_distance(p)[0] for p in [
        (15.5, 70, 32.5),
    ]]
    chamfer(chamfer11_edges, length=CHAMFER11_SIZE)

    # Fillet6
    fillet6_edges = [part.edges().sort_by_distance(p)[0] for p in [
        (20, 50, -37.5),
    ]]
    fillet(fillet6_edges, radius=FILLET6_R - 0.0001)  # a hair under: the kernel refuses the full size

    # Chamfer13
    chamfer13_edges = [part.edges().sort_by_distance(p)[0] for p in [
        (40, -50, -47.5),
        (0, -50, -47.5),
        (0, -30, -2.5),
        (0, -70, 12.5),
        (0, -67.071067812, 69.571067812),
        (0, -32.928932188, -44.571067812),
        (0, -67.071067812, -44.571067812),
        (40, -70, 12.5),
        (40, 10, 72.5),
        (40, -30, -2.5),
        (40, -67.071067812, 69.571067812),
        (40, -32.928932188, -44.571067812),
        (40, -67.071067812, -44.571067812),
        (0, 0, 37.5),
        (40, 0, 37.5),
        (0, 30, 2.5),
        (40, 30, 2.5),
        (0, -28.535533906, 36.035533906),
        (40, -28.535533906, 36.035533906),
        (0, 28.535533906, 36.035533906),
        (40, 28.535533906, 36.035533906),
        (20, 90, 72.5),
        (20, 90, 32.5),
        (0, 10, 72.5),
        (37.071067812, 87.071067812, 72.5),
        (2.928932188, 87.071067812, 72.5),
        (0, 65, 32.5),
        (40, 65, 32.5),
        (37.071067812, 87.071067812, 32.5),
        (2.928932188, 87.071067812, 32.5),
        (0, 32.928932188, -34.571067812),
        (40, 32.928932188, -34.571067812),
        (40, 50, 2.49995),
        (0, 50, 2.49995),
        (0, 47.071097101, -34.571097101),
        (40, 47.071097101, -34.571097101),
    ]]
    chamfer(chamfer13_edges, length=CHAMFER13_SIZE)

    # Ø1.5mm Dowel Hole1
    with Locations(Plane(origin=(0, 0, 32.5), x_dir=(-1, 0, 0), z_dir=(0, 0, -1))):
        with Locations((-29.526279442, 64.5), (-20, 81), (-10.473720558, 64.5), (-20, 70)):
            CounterSinkHole(F_1_5MM_DOWEL_HOLE1_D / 2, F_1_5MM_DOWEL_HOLE1_CSINK_D / 2, depth=F_1_5MM_DOWEL_HOLE1_DEPTH, counter_sink_angle=F_1_5MM_DOWEL_HOLE1_CSINK_ANGLE)
            with Locations((0, 0, -(F_1_5MM_DOWEL_HOLE1_DEPTH + F_1_5MM_DOWEL_HOLE1_TIP / 2))):  # 118° drill point
                Cone(0, F_1_5MM_DOWEL_HOLE1_D / 2, F_1_5MM_DOWEL_HOLE1_TIP, mode=Mode.SUBTRACT)


solid = part.part
